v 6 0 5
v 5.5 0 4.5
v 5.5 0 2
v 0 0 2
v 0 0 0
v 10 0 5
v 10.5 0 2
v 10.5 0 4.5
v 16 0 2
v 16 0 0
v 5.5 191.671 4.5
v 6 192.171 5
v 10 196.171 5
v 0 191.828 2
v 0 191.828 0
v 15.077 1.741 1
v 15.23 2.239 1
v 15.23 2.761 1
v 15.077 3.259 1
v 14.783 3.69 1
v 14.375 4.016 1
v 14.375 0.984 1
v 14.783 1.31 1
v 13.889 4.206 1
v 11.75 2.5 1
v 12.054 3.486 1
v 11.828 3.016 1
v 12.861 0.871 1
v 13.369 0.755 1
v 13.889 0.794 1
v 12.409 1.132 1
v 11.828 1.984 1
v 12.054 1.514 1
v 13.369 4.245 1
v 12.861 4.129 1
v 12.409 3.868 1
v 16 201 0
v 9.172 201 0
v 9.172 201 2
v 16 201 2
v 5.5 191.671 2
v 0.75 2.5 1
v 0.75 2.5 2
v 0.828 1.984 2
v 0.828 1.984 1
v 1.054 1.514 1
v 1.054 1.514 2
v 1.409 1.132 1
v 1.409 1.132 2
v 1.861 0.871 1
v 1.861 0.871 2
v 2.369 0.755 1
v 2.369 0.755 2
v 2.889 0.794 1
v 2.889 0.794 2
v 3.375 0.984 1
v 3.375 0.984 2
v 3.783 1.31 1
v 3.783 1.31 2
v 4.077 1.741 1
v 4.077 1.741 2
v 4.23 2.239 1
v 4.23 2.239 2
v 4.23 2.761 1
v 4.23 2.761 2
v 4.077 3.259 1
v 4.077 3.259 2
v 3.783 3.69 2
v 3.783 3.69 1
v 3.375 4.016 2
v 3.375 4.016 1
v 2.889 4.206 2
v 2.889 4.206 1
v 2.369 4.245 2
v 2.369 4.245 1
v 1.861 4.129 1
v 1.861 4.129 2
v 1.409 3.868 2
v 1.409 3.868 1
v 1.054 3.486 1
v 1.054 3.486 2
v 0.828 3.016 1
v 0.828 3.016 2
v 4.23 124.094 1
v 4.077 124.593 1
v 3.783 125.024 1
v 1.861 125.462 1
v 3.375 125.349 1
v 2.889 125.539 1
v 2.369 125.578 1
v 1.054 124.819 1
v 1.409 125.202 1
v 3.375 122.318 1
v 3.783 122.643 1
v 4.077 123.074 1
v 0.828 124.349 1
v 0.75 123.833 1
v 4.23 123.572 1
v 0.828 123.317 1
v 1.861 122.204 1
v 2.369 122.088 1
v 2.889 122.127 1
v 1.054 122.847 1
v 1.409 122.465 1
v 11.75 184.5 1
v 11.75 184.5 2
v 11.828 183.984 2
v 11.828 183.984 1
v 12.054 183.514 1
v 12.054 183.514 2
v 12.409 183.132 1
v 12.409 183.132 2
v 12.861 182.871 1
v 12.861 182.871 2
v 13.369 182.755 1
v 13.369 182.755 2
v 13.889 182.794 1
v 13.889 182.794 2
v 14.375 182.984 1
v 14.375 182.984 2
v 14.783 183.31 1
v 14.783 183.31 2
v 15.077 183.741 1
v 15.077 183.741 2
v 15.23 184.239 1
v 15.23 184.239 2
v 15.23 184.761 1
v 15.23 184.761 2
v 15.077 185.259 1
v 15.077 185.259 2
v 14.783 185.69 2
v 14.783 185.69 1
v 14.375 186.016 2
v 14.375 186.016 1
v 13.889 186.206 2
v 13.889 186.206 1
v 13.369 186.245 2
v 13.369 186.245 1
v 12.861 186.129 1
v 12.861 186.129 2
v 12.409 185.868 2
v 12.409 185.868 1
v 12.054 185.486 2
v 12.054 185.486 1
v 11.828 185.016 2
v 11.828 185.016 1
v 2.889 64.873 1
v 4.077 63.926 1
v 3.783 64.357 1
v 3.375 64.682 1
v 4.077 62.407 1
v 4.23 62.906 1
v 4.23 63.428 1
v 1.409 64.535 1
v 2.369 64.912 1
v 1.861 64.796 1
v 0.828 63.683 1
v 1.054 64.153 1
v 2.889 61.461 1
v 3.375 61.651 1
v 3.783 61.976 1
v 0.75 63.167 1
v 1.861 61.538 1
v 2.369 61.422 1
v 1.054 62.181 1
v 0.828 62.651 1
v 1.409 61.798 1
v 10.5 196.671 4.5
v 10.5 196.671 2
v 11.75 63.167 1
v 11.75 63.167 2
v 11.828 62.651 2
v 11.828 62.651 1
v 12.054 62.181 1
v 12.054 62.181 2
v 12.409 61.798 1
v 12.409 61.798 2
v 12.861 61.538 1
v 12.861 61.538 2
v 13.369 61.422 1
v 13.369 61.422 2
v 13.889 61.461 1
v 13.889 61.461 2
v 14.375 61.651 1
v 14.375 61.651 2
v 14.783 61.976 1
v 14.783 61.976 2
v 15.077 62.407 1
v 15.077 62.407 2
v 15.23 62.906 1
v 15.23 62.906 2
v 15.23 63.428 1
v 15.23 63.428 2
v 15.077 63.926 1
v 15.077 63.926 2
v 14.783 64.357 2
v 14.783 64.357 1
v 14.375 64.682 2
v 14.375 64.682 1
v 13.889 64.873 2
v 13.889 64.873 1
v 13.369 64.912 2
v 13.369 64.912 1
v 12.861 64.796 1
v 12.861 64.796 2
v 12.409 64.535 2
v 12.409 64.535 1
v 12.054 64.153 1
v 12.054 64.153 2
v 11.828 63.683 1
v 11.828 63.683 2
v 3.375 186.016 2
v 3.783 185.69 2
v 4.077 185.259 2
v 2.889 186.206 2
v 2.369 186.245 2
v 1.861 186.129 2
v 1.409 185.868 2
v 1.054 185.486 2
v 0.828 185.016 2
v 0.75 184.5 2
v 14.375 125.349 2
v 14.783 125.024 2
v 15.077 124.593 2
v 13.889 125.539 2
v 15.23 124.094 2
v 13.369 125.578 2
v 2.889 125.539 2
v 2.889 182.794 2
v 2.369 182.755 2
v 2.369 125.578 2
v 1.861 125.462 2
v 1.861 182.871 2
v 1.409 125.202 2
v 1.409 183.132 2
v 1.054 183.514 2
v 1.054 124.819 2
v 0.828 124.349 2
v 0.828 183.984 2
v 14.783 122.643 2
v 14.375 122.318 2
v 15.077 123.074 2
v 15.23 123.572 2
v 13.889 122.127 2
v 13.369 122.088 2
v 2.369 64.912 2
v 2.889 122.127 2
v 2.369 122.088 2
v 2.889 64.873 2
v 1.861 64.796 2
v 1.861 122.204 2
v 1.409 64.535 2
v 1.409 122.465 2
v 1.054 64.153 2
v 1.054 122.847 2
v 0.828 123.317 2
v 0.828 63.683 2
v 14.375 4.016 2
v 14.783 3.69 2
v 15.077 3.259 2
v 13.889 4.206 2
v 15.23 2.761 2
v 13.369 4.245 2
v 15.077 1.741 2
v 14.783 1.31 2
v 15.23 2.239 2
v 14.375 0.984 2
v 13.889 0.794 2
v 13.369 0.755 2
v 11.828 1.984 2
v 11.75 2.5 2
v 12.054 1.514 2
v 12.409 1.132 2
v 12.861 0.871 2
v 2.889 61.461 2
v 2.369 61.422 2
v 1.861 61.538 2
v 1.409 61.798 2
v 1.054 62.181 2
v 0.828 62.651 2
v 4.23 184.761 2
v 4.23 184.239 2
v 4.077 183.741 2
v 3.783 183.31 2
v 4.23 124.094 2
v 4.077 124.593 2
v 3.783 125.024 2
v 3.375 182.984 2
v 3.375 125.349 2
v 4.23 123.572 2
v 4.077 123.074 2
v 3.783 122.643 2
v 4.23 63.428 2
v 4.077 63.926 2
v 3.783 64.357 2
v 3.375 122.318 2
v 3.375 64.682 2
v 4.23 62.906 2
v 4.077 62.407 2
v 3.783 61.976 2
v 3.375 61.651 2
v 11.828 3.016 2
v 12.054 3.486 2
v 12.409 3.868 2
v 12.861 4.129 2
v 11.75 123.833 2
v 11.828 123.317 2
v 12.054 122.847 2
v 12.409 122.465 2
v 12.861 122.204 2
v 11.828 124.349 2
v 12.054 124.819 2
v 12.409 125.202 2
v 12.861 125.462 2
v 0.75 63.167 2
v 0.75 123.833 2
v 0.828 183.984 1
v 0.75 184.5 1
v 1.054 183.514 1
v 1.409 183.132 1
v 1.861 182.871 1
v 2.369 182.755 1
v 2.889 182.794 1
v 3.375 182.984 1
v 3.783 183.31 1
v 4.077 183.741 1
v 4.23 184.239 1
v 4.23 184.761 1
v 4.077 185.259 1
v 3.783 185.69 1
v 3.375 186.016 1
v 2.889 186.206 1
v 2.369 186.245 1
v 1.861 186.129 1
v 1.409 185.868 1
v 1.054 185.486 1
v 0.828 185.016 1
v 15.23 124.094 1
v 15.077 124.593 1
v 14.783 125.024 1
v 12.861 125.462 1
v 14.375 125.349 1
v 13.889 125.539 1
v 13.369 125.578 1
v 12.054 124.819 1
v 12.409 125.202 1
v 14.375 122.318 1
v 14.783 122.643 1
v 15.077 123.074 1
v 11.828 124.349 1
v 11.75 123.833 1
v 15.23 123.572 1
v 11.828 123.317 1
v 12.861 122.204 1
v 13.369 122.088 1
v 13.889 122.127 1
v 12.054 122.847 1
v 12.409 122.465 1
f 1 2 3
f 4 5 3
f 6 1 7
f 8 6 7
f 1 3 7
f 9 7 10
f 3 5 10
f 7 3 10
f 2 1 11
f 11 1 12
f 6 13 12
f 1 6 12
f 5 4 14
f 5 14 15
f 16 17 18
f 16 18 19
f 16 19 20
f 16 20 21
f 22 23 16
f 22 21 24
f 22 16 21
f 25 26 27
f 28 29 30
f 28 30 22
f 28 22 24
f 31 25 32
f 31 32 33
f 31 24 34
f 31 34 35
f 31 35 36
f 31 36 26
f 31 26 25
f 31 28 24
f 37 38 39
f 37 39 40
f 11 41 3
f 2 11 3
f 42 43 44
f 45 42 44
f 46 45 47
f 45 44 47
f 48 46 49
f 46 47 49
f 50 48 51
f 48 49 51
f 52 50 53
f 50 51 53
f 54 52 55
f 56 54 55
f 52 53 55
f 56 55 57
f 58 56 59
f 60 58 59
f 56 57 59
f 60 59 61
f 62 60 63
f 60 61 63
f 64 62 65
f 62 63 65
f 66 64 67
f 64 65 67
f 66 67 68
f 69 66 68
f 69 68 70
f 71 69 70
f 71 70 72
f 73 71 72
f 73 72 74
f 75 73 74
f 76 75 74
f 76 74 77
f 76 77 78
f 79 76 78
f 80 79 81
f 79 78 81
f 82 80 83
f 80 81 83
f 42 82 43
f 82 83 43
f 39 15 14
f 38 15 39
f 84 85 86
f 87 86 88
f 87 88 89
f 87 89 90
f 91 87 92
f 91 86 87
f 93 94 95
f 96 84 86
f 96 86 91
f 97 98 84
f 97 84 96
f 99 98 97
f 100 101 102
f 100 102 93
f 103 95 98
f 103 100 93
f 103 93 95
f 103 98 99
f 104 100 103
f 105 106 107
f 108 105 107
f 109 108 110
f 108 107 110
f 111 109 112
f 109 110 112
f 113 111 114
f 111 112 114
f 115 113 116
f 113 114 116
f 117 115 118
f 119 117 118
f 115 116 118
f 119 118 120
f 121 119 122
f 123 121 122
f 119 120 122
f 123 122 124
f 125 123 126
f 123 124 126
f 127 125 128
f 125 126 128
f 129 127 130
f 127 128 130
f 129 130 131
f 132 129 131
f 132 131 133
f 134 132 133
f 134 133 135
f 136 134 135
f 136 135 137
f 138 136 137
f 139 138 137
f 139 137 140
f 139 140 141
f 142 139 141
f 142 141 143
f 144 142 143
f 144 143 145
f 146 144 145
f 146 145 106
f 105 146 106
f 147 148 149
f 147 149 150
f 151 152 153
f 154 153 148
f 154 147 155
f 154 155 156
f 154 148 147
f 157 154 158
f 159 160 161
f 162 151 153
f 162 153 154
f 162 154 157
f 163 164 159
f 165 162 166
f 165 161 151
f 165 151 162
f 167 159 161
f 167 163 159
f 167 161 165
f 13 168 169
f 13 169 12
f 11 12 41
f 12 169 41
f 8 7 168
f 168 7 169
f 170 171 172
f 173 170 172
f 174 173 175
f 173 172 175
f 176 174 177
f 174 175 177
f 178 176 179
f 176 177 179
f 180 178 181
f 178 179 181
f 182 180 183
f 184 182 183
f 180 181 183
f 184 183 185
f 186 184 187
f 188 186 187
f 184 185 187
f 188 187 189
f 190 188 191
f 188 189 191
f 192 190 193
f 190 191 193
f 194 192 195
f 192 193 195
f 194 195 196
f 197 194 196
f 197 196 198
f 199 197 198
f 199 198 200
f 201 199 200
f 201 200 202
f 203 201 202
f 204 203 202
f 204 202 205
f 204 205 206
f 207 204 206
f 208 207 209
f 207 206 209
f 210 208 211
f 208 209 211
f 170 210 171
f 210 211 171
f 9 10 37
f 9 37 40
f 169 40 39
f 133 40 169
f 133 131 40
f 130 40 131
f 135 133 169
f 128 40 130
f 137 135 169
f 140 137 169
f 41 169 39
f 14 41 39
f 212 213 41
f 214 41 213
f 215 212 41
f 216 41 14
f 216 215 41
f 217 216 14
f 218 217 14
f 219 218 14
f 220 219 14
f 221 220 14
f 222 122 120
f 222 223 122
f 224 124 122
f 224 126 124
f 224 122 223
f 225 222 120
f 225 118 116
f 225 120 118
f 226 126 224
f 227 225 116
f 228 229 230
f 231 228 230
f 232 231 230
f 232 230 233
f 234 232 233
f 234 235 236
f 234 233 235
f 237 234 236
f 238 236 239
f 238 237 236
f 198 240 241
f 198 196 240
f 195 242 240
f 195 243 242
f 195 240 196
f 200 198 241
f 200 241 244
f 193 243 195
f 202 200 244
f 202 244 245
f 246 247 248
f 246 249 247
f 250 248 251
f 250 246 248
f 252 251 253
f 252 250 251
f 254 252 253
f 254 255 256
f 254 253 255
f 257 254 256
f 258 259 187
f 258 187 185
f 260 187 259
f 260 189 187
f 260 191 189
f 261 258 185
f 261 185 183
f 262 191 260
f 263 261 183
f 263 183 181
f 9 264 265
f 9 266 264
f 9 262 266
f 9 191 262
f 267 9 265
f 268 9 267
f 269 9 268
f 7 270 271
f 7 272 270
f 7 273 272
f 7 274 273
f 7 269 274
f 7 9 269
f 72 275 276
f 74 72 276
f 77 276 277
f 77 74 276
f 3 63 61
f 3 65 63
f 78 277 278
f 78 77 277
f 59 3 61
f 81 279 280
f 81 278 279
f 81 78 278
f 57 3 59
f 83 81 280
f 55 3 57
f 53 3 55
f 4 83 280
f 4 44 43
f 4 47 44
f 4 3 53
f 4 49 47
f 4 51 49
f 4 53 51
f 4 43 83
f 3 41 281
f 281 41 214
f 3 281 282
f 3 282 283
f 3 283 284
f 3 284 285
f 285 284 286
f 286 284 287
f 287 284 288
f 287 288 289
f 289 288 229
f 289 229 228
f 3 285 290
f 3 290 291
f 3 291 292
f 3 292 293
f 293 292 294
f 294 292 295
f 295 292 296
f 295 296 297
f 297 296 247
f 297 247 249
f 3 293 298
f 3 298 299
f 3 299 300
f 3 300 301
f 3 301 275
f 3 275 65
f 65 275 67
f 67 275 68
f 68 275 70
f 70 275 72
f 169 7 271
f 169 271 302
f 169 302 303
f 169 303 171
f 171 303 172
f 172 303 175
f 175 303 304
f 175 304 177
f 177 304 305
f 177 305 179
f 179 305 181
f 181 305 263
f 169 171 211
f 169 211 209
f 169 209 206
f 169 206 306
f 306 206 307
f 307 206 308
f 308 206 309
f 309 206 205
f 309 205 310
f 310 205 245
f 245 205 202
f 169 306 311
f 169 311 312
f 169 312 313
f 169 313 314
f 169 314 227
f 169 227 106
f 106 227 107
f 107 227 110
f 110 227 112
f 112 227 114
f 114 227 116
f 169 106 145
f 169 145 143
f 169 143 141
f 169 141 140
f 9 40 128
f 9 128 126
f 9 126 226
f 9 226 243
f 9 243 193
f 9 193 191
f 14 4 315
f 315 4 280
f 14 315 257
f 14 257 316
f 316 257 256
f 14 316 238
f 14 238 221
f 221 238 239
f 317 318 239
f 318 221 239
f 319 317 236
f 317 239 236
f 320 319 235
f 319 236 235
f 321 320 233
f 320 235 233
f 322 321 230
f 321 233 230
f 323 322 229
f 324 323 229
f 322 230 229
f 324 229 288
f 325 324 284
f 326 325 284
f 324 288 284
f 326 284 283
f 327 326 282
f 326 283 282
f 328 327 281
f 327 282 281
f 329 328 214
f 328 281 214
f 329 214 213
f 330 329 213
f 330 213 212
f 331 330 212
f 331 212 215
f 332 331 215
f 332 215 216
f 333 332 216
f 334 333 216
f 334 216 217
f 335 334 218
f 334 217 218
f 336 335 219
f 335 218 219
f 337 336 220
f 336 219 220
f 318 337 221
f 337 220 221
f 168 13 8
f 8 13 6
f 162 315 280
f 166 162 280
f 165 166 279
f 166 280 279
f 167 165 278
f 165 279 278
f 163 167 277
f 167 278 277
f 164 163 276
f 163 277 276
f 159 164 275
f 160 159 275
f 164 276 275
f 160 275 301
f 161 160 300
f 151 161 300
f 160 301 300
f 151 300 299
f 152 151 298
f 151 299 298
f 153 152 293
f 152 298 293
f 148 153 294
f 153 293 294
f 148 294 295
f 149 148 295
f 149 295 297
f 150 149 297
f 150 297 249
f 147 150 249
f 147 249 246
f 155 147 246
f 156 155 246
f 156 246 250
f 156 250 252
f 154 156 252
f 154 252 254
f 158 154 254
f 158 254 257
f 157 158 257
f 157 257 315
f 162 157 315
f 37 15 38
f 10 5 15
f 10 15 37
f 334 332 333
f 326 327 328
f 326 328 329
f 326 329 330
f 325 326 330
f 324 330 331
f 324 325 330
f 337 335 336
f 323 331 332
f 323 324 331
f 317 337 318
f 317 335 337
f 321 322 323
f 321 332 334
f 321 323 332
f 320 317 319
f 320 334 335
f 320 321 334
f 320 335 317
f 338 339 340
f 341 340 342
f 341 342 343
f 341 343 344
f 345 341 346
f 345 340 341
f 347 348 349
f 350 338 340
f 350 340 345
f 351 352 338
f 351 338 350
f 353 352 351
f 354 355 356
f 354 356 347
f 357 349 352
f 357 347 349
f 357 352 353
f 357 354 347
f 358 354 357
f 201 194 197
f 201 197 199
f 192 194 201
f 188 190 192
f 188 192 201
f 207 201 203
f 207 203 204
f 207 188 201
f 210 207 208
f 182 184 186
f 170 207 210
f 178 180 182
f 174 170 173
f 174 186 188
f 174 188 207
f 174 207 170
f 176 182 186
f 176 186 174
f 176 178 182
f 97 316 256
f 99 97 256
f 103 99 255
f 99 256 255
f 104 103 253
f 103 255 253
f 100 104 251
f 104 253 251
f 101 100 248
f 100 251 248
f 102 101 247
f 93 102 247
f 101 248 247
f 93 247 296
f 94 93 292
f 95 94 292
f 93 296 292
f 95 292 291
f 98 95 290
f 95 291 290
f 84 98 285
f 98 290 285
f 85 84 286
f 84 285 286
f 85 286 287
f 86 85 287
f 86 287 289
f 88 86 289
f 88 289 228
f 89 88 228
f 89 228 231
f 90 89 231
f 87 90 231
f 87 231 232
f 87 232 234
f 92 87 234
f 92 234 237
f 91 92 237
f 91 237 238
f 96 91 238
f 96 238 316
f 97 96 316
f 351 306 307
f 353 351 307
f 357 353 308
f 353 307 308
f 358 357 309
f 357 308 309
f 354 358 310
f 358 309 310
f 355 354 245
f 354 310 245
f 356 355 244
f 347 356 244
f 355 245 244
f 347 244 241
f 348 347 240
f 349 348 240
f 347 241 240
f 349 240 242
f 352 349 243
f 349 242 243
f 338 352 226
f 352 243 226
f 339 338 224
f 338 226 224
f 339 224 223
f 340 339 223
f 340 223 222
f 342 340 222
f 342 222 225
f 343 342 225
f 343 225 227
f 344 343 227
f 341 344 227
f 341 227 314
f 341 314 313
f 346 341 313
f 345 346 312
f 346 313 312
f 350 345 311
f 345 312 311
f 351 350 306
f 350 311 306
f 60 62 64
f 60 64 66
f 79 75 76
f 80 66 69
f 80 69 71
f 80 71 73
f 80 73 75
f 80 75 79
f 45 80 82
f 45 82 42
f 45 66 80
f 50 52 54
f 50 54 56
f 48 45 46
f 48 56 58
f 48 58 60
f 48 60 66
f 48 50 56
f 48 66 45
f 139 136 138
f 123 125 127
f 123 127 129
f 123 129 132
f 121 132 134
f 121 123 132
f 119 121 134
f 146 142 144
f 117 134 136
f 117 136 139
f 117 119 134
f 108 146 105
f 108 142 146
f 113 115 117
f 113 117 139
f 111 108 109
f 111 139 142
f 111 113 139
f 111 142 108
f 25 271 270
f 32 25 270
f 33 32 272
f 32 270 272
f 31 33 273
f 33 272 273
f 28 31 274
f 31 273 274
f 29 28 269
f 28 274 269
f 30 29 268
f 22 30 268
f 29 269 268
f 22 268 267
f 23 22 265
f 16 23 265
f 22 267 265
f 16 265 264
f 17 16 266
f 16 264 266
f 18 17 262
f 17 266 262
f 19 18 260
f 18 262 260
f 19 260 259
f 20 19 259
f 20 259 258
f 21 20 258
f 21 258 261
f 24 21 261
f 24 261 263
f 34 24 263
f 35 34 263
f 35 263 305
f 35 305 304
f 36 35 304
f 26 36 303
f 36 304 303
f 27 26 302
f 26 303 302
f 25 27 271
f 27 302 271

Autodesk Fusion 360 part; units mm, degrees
sketch "3D-printed conduit top outline" plane through (0, 0, 0) normal (0, 1, 0) x (1, 0, 0)
  line L0 (0, 0) -> (16, 0)
  line L1 (16, 0) -> (16, -2)
  line L2 (16, -2) -> (0, -2)
  line L3 (0, -2) -> (0, 0)
  dimension "d7" = 16
  dimension "d8" = 2
extrude "Extrude1" add sketch "3D-printed conduit top outline" along normal blind 201
sketch "Magnet holes" plane through (0, 0, 2) normal (0, 0, 1) x (-1, 0, 0)
  line L0 (0, 0) -> (-16, 0)
  line L1 (-16, 0) -> (-16, -201)
  line L2 (-16, -201) -> (0, -201)
  line L3 (0, -201) -> (0, 0)
  circle A0 centre (-2.5, -2.5) radius 2.5
  circle A1 centre (-13.5, -2.5) radius 2.5
  circle A2 centre (-2.5, -2.5) radius 1.75
  circle A3 centre (-13.5, -2.5) radius 1.75
  circle A4 centre (-2.5, -63.1667) radius 1.75
  circle A5 centre (-2.5, -63.1667) radius 2.5
  circle A6 centre (-13.5, -63.1667) radius 2.5
  circle A7 centre (-13.5, -63.1667) radius 1.75
  circle A8 centre (-2.5, -123.8333) radius 1.75
  circle A9 centre (-2.5, -123.8333) radius 2.5
  circle A10 centre (-13.5, -123.8333) radius 2.5
  circle A11 centre (-13.5, -123.8333) radius 1.75
  circle A12 centre (-2.5, -184.5) radius 1.75
  circle A13 centre (-2.5, -184.5) radius 2.5
  circle A14 centre (-13.5, -184.5) radius 2.5
  circle A15 centre (-13.5, -184.5) radius 1.75
  dimension "d11" = 5
  dimension "d12" = 5
  dimension "d13" = 3.5
  dimension "d14" = 3.5
  dimension "d17" = 0
  dimension "d18" = -182
extrude "Extrude2" cut sketch "Magnet holes" against normal blind 1 contours A2 | A3 | A4 | A7 | A8 | A11 | A12 | A15
sketch "Support rib" plane through (0, 0, 2) normal (0, 0, 1) x (-1, 0, 0)
  line L0 (0, 0) -> (-16, 0)
  line L1 (-16, 0) -> (-16, -201)
  line L2 (-16, -201) -> (0, -201)
  line L3 (0, -201) -> (0, 0)
  circle A0 centre (-13.5, -184.5) radius 1.75
  circle A1 centre (-13.5, -63.1667) radius 1.75
  circle A2 centre (-2.5, -2.5) radius 1.75
  circle A3 centre (-2.5, -123.8333) radius 1.75
  circle A4 centre (-2.5, -184.5) radius 1.75
  circle A5 centre (-2.5, -63.1667) radius 1.75
  circle A6 centre (-13.5, -2.5) radius 1.75
  circle A7 centre (-13.5, -123.8333) radius 1.75
  line L4 (-5.5, 0) -> (-10.5, 0)
  line L5 (-10.5, 0) -> (-10.5, -201)
  line L6 (-10.5, -201) -> (-5.5, -201)
  line L7 (-5.5, -201) -> (-5.5, 0)
  dimension "d23" = 5
  dimension "d24" = 5.5
  dimension "d25" = 5.5
extrude "Extrude3" add sketch "Support rib" along normal blind 3 contours L0 L2 L4 L5 L6 L7
chamfer "Chamfer1" distance 0.5 angle 45 2 edges at (5.5, 100.5, 5) (10.5, 100.5, 5)
sketch "End chamfer" plane through (0, 0, 2) normal (0, 0, 1) x (-1, 0, 0)
  line L0 (-10.5, -201) -> (-10.5, 0)
  line L1 (-10.5, 0) -> (-16, 0)
  line L2 (-16, 0) -> (-16, -201)
  line L3 (-16, -201) -> (-10.5, -201)
  circle A0 centre (-13.5, -123.8333) radius 1.75
  circle A1 centre (-13.5, -2.5) radius 1.75
  circle A2 centre (-13.5, -63.1667) radius 1.75
  circle A3 centre (-13.5, -184.5) radius 1.75
  line L4 (0, -191.828) -> (-9.172, -201)
  line L5 (0, 0) -> (0, -201)
  line L6 (-14.8289, -201) -> (0, -186.1711)
  line L7 (0, -191.828) -> (0, -201)
  line L8 (0, -201) -> (-9.172, -201)
  line L9 (-9.172, -201) -> (-14.8289, -201)
  line L10 (0, -191.828) -> (0, -186.1711)
  dimension "d30" = 6.828
  dimension "d31" = 135
  dimension "d32" = 4
extrude "Extrude4" cut sketch "End chamfer" along normal blind 3 and the other way blind 2 contours L4 L5 L7 L8
extrude "Extrude5" cut sketch "End chamfer" along normal blind 3 contours L0 L3 L6 L9 | L0 L4 L5 L6 L9 L10
equation "conduit_length = 201 mm"
equation "conduit_width = 16 mm"
equation "conduit_wall_thickness = 2 mm"
equation "magnet_diameter = 3 mm"
equation "magnet_height = 1 mm"
equation "number_of_magnets_on_a_side = 4"
equation "d7 = conduit_width"
equation "d8 = conduit_wall_thickness"
equation "d9 = conduit_length"
equation "d11 = magnet_diameter + 2 mm"
equation "d12 = magnet_diameter + 2 mm"
equation "d13 = magnet_diameter + 0.5 mm"
equation "d14 = magnet_diameter + 0.5 mm"
equation "d16 = number_of_magnets_on_a_side"
equation "d18 = -conduit_length + ( magnet_diameter + 2 mm ) + 14 mm"
equation "d19 = -magnet_height"
equation "rib_width = 5 mm"
equation "rib_height = 3 mm"
equation "d23 = rib_width"
equation "d24 = ( conduit_width - rib_width ) / 2"
equation "d26 = rib_height"
equation "rib_chamfer = 0.5 mm"
equation "d29 = rib_chamfer"
equation "d32 = 2 * conduit_wall_thickness"
equation "d33 = rib_height"
equation "d35 = conduit_wall_thickness"
equation "d37 = rib_height"
